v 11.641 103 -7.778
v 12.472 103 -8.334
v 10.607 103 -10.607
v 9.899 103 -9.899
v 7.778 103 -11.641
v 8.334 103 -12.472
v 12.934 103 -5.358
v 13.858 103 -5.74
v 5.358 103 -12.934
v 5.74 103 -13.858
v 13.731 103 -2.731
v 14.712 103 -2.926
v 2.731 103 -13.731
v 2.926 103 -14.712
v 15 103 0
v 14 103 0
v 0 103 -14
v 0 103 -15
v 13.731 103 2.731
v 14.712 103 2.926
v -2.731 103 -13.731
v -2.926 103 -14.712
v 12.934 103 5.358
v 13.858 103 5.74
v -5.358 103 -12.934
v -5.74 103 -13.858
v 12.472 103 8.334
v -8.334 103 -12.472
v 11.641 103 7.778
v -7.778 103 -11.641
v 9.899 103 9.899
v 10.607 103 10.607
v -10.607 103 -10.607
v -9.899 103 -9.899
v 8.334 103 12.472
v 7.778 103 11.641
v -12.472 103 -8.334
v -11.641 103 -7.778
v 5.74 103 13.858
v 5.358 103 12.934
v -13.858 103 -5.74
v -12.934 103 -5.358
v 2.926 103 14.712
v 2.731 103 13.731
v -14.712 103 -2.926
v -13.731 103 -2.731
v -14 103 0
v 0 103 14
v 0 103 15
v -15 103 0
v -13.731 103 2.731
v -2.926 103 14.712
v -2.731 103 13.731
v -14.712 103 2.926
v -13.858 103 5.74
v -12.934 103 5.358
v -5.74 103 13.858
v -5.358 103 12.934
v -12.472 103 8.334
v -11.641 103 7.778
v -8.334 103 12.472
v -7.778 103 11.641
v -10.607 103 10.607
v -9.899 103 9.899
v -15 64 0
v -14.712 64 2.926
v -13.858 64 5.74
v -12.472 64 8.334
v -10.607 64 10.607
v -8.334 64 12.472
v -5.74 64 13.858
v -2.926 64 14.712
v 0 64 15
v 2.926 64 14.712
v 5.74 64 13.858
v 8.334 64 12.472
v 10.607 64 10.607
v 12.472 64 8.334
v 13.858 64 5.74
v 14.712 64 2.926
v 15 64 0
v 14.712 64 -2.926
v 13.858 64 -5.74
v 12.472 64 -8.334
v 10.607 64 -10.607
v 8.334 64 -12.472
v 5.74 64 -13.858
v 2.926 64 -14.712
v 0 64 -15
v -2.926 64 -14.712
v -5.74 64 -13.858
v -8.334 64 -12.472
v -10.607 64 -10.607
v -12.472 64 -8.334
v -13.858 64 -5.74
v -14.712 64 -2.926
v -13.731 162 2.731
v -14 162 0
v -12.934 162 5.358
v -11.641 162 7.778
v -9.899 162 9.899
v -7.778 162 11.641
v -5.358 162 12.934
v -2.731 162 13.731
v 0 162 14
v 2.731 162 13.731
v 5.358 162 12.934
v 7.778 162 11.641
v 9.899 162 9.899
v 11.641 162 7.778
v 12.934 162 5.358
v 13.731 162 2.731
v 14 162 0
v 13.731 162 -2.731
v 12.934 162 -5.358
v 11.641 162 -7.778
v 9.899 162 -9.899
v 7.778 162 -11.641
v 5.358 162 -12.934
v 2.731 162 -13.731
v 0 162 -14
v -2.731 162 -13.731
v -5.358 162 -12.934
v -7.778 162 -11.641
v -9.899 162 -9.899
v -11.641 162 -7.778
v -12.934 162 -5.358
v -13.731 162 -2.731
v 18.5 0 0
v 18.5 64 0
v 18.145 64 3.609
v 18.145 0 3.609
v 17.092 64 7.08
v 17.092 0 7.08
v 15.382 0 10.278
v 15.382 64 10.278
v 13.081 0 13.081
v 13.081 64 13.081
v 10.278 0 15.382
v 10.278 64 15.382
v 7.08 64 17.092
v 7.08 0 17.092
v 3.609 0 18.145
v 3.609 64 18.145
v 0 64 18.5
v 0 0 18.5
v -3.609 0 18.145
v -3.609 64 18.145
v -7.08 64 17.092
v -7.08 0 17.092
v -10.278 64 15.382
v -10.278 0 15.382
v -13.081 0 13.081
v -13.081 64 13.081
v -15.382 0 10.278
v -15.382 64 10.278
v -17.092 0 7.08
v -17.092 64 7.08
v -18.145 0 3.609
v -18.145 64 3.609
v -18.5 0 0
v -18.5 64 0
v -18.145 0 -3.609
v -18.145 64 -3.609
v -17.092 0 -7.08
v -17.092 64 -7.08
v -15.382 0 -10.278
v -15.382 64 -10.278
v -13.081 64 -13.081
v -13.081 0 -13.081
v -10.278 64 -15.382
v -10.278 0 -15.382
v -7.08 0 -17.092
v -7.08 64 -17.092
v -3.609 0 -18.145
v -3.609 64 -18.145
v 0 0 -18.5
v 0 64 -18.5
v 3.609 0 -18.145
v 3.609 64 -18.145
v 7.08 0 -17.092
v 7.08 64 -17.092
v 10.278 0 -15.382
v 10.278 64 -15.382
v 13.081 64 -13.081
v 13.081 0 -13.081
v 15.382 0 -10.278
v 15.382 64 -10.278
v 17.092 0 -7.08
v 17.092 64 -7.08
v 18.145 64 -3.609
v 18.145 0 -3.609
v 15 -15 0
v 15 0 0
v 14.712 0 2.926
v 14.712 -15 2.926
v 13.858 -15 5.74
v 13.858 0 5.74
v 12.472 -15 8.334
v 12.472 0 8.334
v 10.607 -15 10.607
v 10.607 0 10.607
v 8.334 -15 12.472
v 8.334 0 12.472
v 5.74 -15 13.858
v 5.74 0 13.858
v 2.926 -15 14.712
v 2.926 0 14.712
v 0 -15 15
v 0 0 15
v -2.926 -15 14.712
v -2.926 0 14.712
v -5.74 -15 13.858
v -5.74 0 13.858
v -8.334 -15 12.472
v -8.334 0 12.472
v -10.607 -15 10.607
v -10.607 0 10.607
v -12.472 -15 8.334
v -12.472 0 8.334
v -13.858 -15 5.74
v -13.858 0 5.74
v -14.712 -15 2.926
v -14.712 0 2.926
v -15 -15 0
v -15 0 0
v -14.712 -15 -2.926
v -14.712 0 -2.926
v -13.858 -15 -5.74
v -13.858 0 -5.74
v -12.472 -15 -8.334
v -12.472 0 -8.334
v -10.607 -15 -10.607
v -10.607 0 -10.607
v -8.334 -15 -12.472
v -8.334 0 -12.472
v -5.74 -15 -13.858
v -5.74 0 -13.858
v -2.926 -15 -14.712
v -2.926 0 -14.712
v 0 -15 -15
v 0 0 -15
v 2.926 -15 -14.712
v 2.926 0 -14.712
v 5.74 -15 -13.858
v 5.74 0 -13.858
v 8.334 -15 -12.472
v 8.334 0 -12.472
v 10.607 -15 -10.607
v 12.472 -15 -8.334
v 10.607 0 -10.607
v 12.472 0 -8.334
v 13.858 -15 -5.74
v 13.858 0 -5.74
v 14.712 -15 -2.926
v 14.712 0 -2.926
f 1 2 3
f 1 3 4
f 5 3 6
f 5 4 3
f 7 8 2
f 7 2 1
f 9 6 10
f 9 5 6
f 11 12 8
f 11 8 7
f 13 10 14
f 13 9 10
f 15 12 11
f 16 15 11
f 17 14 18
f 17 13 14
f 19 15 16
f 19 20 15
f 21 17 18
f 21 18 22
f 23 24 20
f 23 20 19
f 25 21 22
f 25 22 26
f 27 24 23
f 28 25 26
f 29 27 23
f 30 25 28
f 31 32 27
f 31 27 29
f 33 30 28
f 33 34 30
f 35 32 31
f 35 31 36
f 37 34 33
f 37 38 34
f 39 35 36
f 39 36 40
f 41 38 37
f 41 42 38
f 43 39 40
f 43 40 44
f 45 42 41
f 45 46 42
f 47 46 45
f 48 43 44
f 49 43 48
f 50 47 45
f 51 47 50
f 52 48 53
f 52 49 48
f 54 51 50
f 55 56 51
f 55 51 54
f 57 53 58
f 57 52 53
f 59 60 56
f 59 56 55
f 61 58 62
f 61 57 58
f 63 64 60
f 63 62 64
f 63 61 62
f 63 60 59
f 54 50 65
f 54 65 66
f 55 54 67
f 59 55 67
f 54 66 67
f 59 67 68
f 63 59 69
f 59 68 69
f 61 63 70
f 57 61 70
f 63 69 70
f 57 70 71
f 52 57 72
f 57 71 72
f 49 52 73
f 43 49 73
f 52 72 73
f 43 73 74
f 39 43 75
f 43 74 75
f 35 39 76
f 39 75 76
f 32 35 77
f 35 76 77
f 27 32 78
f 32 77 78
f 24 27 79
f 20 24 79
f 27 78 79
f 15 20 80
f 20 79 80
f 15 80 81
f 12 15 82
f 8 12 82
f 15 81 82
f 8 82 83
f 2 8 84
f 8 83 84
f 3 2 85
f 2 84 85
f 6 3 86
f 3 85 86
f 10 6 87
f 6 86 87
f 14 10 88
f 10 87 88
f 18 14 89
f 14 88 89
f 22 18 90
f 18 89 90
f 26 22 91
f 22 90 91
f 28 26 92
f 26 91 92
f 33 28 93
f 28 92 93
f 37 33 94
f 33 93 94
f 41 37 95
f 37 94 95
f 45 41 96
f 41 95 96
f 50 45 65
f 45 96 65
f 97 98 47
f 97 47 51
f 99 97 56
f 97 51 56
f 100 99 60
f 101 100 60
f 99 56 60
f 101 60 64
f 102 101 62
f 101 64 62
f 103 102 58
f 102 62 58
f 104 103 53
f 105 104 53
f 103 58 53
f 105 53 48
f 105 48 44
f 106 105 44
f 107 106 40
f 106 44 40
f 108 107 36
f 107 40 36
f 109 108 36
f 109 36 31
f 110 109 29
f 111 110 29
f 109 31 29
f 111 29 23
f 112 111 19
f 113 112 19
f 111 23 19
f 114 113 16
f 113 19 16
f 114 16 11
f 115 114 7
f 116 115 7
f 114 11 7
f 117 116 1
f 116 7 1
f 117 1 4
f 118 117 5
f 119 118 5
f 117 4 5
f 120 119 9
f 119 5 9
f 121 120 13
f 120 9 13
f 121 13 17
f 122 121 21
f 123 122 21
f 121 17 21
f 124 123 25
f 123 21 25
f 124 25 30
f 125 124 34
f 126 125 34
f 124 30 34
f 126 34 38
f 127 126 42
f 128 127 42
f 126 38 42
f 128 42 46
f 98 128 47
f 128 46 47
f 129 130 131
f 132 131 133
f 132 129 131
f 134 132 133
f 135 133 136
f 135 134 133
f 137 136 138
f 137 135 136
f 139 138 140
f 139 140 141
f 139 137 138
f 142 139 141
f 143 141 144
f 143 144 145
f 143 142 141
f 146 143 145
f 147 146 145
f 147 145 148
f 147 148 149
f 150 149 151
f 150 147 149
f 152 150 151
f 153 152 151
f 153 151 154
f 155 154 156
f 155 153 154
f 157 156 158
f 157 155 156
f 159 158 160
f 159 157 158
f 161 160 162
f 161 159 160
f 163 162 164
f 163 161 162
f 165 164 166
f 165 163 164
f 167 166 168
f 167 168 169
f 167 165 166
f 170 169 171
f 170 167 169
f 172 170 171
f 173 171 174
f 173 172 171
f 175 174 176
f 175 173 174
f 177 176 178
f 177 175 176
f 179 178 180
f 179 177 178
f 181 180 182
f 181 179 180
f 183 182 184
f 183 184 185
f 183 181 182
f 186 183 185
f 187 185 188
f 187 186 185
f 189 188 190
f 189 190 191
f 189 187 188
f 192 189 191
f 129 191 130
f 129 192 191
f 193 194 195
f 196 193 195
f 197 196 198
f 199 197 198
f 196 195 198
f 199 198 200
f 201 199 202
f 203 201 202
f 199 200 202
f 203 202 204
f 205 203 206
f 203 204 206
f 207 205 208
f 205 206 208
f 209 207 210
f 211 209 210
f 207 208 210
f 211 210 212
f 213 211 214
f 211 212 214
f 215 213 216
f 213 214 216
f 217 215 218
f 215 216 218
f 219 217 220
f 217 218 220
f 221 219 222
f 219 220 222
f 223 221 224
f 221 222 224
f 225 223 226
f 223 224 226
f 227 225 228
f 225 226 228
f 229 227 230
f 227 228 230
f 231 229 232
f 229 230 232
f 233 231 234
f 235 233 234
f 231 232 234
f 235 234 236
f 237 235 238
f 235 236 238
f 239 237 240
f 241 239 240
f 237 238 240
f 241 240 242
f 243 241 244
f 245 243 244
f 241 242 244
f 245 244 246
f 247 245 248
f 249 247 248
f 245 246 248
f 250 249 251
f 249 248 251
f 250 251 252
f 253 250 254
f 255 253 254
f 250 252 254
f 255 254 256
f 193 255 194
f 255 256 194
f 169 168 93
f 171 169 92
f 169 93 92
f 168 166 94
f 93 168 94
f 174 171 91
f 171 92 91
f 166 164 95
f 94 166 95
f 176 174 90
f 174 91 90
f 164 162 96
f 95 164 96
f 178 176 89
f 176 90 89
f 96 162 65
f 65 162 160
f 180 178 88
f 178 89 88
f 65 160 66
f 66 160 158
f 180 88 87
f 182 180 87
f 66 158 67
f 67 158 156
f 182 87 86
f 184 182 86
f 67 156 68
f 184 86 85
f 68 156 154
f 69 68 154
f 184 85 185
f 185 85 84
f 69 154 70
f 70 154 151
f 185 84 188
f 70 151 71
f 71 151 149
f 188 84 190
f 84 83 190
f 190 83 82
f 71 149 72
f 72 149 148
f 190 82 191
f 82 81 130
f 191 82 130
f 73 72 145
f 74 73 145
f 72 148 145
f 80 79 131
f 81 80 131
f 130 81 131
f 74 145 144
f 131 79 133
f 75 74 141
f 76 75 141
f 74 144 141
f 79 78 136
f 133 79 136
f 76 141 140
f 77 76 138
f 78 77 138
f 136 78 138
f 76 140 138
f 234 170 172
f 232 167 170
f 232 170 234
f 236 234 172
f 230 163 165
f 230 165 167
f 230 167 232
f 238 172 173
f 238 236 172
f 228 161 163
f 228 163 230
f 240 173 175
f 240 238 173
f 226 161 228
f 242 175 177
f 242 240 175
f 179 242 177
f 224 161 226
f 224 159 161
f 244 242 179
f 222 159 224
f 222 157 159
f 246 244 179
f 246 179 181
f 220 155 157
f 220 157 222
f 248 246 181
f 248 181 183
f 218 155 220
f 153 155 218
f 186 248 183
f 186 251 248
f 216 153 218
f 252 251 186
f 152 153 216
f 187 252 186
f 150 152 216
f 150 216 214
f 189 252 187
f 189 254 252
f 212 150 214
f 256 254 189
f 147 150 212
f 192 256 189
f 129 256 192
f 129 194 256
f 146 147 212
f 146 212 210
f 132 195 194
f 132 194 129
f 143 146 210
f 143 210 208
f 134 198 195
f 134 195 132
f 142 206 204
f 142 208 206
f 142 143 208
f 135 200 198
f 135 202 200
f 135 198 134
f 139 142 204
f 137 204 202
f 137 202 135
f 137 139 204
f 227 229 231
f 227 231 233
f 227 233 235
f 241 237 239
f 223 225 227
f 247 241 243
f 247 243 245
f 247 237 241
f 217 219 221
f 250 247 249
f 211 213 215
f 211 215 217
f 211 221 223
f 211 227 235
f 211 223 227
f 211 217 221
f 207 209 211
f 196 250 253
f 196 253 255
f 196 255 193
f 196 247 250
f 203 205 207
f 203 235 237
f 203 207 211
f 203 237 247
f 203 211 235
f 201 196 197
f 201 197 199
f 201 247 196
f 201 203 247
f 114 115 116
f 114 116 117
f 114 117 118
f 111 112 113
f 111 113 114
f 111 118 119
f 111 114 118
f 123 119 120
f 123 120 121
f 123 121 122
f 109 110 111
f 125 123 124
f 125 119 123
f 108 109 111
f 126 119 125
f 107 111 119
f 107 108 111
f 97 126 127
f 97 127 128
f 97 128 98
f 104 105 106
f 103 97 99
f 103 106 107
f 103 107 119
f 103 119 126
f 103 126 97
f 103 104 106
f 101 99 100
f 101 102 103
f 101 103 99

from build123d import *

# Parameters (mm, degrees)
F0_R     = 15
F1_DEPTH = 15
F2_R     = 18.5
F3_DEPTH = 64
F4_R     = 15
F5_DEPTH = 39
F6_R     = 14
F7_DEPTH = 59


with BuildPart() as f1:
    # F0 (on Front) → F1 (new body)
    with BuildSketch(Plane.XZ):
        Circle(F0_R)
    extrude(amount=F1_DEPTH)

    # F2 (on Front) → F3 (join)
    with BuildSketch(Plane.XZ):
        Circle(F2_R)
    extrude(amount=-F3_DEPTH)

    # F4 (on face) → F5 (join)
    with BuildSketch(Plane(origin=(0, 64, 0), x_dir=(-1, 0, 0), z_dir=(0, 1, 0))):
        Circle(F4_R)
    extrude(amount=F5_DEPTH)

    # F6 (on face) → F7 (join)
    with BuildSketch(Plane(origin=(0, 103, 0), x_dir=(-1, 0, 0), z_dir=(0, 1, 0))):
        Circle(F6_R)
    extrude(amount=F7_DEPTH)


solid = f1.part
